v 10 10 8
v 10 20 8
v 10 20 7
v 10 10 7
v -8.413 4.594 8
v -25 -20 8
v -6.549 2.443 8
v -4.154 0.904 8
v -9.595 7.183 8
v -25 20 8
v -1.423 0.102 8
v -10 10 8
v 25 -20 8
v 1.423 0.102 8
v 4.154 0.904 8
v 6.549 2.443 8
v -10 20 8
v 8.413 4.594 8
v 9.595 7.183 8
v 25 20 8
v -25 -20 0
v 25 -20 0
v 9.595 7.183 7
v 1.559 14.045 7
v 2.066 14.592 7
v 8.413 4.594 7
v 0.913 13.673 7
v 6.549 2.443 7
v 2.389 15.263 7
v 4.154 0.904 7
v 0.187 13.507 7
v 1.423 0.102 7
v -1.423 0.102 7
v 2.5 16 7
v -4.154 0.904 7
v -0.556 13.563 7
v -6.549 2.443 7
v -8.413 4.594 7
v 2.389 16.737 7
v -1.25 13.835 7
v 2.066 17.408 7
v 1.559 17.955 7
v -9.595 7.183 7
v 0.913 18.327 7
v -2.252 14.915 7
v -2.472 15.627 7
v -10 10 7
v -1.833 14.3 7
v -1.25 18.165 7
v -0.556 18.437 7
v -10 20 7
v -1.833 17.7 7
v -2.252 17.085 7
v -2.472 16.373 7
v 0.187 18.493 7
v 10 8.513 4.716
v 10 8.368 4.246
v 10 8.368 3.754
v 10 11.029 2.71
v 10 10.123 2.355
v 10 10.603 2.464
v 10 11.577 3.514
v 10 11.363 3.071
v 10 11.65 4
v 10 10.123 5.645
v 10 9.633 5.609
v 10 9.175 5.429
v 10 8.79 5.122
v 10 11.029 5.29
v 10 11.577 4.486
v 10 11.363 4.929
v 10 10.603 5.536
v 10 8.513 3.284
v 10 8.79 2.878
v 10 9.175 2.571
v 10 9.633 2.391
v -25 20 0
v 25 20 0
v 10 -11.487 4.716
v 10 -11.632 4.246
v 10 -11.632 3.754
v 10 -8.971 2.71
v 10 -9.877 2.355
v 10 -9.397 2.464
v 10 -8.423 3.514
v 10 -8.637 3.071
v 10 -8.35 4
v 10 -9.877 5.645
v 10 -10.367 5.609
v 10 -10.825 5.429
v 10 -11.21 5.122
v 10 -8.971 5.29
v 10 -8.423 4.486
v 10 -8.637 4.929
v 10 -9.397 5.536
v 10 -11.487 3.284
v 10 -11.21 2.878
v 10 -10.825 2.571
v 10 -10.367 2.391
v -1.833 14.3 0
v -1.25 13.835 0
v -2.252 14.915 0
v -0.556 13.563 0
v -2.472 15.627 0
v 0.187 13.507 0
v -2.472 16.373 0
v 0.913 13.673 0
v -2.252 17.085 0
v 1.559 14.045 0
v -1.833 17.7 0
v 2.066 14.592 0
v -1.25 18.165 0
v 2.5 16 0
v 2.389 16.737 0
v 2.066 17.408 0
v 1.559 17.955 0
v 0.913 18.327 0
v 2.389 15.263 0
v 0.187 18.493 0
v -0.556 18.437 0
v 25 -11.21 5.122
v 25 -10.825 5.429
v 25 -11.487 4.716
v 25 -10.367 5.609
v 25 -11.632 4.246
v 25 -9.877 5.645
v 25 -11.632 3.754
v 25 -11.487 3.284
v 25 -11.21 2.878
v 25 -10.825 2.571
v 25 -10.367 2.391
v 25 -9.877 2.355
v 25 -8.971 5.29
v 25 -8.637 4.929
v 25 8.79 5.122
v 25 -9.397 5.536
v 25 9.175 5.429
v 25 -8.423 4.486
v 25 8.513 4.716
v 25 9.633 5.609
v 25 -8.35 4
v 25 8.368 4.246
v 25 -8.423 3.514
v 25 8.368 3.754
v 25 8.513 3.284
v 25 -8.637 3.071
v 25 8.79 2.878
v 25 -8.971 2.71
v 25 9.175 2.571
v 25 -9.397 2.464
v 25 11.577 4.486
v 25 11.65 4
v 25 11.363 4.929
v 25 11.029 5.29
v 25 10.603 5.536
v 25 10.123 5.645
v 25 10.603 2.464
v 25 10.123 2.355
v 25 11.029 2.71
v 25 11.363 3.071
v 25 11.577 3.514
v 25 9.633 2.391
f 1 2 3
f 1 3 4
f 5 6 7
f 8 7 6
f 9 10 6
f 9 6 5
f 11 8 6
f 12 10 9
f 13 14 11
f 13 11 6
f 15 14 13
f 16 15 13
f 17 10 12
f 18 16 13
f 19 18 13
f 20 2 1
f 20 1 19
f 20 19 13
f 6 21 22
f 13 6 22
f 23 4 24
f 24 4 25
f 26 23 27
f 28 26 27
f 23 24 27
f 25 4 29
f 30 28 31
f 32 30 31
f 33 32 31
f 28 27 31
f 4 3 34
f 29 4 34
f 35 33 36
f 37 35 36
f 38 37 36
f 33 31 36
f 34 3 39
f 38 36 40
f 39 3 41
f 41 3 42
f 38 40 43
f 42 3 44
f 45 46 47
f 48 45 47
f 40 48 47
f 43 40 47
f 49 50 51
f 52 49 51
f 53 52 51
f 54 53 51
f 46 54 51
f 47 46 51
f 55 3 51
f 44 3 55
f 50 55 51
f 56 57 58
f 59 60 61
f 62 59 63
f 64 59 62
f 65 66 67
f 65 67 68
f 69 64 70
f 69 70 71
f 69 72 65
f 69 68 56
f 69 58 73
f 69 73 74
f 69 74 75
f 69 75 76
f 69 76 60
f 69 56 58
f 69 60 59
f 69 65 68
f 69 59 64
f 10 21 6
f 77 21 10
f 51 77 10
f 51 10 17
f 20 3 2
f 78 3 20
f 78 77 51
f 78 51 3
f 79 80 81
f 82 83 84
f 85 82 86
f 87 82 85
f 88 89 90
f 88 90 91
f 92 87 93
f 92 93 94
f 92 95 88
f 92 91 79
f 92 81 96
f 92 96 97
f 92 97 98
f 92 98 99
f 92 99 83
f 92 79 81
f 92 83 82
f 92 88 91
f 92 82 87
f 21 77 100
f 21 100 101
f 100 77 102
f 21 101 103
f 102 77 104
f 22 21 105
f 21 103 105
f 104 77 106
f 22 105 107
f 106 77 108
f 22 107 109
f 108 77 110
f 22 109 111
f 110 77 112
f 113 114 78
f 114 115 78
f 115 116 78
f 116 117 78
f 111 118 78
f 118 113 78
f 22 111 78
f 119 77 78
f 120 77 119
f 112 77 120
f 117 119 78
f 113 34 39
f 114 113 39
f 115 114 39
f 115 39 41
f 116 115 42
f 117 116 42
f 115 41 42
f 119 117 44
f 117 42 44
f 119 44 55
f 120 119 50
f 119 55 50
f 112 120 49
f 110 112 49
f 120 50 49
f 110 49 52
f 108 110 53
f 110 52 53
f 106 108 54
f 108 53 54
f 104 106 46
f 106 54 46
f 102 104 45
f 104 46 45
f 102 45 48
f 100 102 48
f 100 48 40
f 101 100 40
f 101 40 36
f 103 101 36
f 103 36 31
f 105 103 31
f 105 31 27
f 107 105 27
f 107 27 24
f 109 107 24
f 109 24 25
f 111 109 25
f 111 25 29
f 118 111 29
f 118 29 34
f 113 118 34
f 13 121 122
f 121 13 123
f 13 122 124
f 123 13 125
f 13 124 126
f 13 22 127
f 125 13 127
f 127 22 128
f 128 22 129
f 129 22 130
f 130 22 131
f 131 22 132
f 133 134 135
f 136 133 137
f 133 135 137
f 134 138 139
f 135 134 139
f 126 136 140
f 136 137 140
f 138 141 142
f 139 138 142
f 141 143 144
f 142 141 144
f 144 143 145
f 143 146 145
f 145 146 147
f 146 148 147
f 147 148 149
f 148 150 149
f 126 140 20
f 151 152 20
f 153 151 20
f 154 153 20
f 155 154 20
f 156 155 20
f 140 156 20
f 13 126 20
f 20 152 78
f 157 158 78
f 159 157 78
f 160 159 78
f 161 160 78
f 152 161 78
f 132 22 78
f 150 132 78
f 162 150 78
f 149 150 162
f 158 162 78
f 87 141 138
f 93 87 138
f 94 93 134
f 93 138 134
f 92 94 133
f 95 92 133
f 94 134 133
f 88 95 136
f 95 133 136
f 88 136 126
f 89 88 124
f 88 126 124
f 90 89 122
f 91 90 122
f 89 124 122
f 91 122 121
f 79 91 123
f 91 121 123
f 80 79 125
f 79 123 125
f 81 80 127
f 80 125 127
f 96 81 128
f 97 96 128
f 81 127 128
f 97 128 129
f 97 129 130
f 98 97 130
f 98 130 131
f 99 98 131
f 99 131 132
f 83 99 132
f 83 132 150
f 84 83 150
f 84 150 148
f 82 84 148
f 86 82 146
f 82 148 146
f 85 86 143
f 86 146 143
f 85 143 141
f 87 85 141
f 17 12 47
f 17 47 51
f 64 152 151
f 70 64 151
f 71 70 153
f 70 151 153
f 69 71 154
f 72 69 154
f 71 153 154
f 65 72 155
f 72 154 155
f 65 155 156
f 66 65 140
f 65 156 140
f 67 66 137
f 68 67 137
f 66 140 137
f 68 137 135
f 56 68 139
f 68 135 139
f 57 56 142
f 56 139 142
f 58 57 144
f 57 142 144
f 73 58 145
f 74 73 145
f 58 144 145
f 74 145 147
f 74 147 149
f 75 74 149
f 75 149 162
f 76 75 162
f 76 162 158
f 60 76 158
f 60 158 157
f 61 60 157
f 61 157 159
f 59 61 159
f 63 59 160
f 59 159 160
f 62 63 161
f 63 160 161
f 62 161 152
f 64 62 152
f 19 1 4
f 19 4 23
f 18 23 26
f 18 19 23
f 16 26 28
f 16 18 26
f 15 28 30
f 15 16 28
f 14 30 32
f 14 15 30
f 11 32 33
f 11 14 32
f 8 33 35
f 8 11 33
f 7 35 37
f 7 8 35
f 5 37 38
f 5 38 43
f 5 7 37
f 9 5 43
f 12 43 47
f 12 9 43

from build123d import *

# Parameters (mm, degrees)
SKETCH_1_W          = 50
SKETCH_1_H          = 40
EXTRUDE_1_DEPTH     = 8
SKETCH_2_R          = 1.65
CUT_EXTRUDE_1_DEPTH = 15
CUT_EXTRUDE_2_DEPTH = 1
SKETCH_5_R          = 2.5
CUT_EXTRUDE_3_DEPTH = 10


with BuildPart() as part:
    # Эскиз1 → Бобышка-Вытянуть1 (new body)
    with BuildSketch(Plane.XY):
        Rectangle(SKETCH_1_W, SKETCH_1_H)
    extrude(amount=EXTRUDE_1_DEPTH)

    # Эскиз2 → Вырез-Вытянуть1 (cut)
    with BuildSketch(Plane(origin=(25, 0, 0), x_dir=(0, 0, -1), z_dir=(1, 0, 0))):
        with Locations(Location((-4, 10, 0), (0, 0, 90))):
            Circle(SKETCH_2_R)
        with Locations(Location((-4, -10, 0), (0, 0, 90))):
            Circle(SKETCH_2_R)
    extrude(amount=-CUT_EXTRUDE_1_DEPTH, mode=Mode.SUBTRACT)

    # Эскиз4 → Вырез-Вытянуть2 (cut)
    with BuildSketch(Plane.XY.offset(8)):
        with BuildLine():
            Line((-10, 20), (10, 20))
            Line((10, 20), (10, 10))
            ThreePointArc((10, 10), (0, 0), (-10, 10))
            Line((-10, 10), (-10, 20))
        make_face()
    extrude(amount=-CUT_EXTRUDE_2_DEPTH, mode=Mode.SUBTRACT)

    # Эскиз5 → Вырез-Вытянуть3 (cut)
    with BuildSketch(Plane.XY.offset(7)):
        with Locations((0, 16)):
            Circle(SKETCH_5_R)
    extrude(amount=-CUT_EXTRUDE_3_DEPTH, mode=Mode.SUBTRACT)


solid = part.part
